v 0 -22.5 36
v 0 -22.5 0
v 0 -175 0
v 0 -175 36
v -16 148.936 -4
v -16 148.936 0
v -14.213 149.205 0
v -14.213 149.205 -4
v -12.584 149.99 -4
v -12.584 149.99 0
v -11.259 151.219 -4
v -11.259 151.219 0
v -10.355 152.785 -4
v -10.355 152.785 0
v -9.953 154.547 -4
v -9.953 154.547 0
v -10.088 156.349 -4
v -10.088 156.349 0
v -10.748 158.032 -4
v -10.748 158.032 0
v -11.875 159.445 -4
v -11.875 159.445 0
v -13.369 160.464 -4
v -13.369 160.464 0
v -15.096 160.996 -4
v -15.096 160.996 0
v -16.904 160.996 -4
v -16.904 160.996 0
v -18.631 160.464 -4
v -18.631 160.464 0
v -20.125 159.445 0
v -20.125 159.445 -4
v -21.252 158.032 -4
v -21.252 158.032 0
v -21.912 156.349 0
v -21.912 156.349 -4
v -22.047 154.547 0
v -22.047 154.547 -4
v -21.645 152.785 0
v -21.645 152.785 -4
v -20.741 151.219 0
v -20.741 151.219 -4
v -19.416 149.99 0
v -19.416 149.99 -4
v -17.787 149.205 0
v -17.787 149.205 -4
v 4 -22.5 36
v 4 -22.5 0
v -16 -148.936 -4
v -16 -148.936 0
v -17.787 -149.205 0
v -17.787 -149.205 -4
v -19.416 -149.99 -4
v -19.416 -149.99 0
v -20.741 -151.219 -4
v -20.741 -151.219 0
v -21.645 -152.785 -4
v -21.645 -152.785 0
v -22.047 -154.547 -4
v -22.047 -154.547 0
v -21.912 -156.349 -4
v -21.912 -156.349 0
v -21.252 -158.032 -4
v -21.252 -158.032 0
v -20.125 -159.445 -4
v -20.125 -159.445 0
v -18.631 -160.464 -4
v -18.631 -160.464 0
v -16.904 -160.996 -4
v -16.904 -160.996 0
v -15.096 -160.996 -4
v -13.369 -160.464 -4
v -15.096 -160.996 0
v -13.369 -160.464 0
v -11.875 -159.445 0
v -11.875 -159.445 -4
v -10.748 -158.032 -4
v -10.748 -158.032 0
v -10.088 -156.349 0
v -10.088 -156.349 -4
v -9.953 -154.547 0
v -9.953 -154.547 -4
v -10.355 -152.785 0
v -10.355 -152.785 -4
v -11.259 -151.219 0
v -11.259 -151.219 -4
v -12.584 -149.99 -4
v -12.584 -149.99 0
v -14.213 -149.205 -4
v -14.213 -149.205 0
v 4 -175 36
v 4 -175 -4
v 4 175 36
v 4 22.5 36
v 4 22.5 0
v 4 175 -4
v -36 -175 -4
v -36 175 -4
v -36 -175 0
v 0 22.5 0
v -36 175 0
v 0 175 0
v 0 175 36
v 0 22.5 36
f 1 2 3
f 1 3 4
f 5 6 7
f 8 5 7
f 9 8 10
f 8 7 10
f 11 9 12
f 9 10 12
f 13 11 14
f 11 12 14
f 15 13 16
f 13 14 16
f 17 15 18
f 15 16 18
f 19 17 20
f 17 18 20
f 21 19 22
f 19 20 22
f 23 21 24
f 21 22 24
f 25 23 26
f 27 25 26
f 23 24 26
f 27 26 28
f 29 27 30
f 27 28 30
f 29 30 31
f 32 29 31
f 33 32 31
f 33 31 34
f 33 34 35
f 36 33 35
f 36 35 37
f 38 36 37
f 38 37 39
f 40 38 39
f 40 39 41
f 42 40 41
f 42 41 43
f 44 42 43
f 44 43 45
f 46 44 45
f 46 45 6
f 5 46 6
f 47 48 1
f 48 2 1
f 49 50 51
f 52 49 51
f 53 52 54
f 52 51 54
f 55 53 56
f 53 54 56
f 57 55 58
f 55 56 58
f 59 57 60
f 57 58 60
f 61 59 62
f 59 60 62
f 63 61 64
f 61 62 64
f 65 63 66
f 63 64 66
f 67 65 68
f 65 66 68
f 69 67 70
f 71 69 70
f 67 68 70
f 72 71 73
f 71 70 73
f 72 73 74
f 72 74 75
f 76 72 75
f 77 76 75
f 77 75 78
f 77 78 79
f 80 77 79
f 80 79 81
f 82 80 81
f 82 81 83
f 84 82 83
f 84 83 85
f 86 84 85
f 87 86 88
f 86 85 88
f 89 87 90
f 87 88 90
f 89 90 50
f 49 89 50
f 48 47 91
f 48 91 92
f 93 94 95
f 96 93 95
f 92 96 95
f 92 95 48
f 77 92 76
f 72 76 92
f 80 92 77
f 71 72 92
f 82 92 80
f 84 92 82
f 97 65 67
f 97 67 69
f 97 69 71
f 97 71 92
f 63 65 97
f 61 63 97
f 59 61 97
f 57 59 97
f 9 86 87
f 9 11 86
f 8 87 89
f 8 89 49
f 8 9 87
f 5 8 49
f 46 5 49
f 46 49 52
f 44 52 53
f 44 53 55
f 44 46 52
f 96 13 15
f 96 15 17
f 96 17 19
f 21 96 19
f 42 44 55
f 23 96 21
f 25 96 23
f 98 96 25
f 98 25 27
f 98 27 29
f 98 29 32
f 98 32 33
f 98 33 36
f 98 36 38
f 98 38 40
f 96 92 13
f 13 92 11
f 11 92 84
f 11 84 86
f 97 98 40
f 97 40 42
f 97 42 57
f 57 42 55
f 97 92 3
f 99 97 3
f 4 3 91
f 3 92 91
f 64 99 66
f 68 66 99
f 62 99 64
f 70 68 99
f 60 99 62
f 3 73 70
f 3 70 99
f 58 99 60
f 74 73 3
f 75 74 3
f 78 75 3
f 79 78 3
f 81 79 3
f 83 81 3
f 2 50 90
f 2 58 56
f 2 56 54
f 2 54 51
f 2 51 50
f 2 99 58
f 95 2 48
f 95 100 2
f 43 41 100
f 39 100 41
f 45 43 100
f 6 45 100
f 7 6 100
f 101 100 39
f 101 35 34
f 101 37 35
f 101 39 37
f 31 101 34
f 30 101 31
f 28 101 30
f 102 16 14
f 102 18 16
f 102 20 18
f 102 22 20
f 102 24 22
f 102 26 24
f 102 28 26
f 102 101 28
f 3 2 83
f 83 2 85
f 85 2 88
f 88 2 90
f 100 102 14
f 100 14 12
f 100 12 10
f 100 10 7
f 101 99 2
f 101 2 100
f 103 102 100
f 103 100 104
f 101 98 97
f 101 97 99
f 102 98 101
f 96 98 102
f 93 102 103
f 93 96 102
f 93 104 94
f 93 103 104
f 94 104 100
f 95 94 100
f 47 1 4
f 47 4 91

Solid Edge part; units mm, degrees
sketch "Sketch1" plane through (0, 0, 0) normal (0, -1, 0) x (1, 0, 0)
  line L0 (-36, 0) -> (0, 0)
  line L1 (0, 0) -> (0, 36)
  line L2 (0, 36) -> (4, 36)
  line L3 (4, 36) -> (4, -4)
  line L4 (4, -4) -> (-36, -4)
  line L5 (-36, -4) -> (-36, 0)
  dimension "D1" = 36
  dimension "D2" = 4
extrude "Protrusion1" add sketch "Sketch1" along normal mid plane 350
mirror "Mirror1" [suppressed]
sketch "Sketch2" plane through (-18, 0, 0) normal (0, 0, 1) x (0, -1, 0)
  circle A0 centre (-155, 2) radius 6.0641
  dimension "D1" = 20
  dimension "D2" = 20
extrude "Cutout1" cut sketch "Sketch2" against normal through all
mirror "Mirror2" about plane through (0, 0, 0) normal (0, -1, 0) of "Cutout1"
sketch "Sketch3" plane through (0, 0, 18) normal (-1, 0, 0) x (0, -1, 0)
  line L0 (-22.5, -18) -> (22.5, -18)
  line L1 (22.5, -18) -> (22.5, 18)
  line L2 (22.5, 18) -> (-22.5, 18)
  line L3 (-22.5, 18) -> (-22.5, -18)
  dimension "D1" = 45
extrude "Cutout2" cut sketch "Sketch3" against normal through all
properties material "Aluminium, 7075-T6"
